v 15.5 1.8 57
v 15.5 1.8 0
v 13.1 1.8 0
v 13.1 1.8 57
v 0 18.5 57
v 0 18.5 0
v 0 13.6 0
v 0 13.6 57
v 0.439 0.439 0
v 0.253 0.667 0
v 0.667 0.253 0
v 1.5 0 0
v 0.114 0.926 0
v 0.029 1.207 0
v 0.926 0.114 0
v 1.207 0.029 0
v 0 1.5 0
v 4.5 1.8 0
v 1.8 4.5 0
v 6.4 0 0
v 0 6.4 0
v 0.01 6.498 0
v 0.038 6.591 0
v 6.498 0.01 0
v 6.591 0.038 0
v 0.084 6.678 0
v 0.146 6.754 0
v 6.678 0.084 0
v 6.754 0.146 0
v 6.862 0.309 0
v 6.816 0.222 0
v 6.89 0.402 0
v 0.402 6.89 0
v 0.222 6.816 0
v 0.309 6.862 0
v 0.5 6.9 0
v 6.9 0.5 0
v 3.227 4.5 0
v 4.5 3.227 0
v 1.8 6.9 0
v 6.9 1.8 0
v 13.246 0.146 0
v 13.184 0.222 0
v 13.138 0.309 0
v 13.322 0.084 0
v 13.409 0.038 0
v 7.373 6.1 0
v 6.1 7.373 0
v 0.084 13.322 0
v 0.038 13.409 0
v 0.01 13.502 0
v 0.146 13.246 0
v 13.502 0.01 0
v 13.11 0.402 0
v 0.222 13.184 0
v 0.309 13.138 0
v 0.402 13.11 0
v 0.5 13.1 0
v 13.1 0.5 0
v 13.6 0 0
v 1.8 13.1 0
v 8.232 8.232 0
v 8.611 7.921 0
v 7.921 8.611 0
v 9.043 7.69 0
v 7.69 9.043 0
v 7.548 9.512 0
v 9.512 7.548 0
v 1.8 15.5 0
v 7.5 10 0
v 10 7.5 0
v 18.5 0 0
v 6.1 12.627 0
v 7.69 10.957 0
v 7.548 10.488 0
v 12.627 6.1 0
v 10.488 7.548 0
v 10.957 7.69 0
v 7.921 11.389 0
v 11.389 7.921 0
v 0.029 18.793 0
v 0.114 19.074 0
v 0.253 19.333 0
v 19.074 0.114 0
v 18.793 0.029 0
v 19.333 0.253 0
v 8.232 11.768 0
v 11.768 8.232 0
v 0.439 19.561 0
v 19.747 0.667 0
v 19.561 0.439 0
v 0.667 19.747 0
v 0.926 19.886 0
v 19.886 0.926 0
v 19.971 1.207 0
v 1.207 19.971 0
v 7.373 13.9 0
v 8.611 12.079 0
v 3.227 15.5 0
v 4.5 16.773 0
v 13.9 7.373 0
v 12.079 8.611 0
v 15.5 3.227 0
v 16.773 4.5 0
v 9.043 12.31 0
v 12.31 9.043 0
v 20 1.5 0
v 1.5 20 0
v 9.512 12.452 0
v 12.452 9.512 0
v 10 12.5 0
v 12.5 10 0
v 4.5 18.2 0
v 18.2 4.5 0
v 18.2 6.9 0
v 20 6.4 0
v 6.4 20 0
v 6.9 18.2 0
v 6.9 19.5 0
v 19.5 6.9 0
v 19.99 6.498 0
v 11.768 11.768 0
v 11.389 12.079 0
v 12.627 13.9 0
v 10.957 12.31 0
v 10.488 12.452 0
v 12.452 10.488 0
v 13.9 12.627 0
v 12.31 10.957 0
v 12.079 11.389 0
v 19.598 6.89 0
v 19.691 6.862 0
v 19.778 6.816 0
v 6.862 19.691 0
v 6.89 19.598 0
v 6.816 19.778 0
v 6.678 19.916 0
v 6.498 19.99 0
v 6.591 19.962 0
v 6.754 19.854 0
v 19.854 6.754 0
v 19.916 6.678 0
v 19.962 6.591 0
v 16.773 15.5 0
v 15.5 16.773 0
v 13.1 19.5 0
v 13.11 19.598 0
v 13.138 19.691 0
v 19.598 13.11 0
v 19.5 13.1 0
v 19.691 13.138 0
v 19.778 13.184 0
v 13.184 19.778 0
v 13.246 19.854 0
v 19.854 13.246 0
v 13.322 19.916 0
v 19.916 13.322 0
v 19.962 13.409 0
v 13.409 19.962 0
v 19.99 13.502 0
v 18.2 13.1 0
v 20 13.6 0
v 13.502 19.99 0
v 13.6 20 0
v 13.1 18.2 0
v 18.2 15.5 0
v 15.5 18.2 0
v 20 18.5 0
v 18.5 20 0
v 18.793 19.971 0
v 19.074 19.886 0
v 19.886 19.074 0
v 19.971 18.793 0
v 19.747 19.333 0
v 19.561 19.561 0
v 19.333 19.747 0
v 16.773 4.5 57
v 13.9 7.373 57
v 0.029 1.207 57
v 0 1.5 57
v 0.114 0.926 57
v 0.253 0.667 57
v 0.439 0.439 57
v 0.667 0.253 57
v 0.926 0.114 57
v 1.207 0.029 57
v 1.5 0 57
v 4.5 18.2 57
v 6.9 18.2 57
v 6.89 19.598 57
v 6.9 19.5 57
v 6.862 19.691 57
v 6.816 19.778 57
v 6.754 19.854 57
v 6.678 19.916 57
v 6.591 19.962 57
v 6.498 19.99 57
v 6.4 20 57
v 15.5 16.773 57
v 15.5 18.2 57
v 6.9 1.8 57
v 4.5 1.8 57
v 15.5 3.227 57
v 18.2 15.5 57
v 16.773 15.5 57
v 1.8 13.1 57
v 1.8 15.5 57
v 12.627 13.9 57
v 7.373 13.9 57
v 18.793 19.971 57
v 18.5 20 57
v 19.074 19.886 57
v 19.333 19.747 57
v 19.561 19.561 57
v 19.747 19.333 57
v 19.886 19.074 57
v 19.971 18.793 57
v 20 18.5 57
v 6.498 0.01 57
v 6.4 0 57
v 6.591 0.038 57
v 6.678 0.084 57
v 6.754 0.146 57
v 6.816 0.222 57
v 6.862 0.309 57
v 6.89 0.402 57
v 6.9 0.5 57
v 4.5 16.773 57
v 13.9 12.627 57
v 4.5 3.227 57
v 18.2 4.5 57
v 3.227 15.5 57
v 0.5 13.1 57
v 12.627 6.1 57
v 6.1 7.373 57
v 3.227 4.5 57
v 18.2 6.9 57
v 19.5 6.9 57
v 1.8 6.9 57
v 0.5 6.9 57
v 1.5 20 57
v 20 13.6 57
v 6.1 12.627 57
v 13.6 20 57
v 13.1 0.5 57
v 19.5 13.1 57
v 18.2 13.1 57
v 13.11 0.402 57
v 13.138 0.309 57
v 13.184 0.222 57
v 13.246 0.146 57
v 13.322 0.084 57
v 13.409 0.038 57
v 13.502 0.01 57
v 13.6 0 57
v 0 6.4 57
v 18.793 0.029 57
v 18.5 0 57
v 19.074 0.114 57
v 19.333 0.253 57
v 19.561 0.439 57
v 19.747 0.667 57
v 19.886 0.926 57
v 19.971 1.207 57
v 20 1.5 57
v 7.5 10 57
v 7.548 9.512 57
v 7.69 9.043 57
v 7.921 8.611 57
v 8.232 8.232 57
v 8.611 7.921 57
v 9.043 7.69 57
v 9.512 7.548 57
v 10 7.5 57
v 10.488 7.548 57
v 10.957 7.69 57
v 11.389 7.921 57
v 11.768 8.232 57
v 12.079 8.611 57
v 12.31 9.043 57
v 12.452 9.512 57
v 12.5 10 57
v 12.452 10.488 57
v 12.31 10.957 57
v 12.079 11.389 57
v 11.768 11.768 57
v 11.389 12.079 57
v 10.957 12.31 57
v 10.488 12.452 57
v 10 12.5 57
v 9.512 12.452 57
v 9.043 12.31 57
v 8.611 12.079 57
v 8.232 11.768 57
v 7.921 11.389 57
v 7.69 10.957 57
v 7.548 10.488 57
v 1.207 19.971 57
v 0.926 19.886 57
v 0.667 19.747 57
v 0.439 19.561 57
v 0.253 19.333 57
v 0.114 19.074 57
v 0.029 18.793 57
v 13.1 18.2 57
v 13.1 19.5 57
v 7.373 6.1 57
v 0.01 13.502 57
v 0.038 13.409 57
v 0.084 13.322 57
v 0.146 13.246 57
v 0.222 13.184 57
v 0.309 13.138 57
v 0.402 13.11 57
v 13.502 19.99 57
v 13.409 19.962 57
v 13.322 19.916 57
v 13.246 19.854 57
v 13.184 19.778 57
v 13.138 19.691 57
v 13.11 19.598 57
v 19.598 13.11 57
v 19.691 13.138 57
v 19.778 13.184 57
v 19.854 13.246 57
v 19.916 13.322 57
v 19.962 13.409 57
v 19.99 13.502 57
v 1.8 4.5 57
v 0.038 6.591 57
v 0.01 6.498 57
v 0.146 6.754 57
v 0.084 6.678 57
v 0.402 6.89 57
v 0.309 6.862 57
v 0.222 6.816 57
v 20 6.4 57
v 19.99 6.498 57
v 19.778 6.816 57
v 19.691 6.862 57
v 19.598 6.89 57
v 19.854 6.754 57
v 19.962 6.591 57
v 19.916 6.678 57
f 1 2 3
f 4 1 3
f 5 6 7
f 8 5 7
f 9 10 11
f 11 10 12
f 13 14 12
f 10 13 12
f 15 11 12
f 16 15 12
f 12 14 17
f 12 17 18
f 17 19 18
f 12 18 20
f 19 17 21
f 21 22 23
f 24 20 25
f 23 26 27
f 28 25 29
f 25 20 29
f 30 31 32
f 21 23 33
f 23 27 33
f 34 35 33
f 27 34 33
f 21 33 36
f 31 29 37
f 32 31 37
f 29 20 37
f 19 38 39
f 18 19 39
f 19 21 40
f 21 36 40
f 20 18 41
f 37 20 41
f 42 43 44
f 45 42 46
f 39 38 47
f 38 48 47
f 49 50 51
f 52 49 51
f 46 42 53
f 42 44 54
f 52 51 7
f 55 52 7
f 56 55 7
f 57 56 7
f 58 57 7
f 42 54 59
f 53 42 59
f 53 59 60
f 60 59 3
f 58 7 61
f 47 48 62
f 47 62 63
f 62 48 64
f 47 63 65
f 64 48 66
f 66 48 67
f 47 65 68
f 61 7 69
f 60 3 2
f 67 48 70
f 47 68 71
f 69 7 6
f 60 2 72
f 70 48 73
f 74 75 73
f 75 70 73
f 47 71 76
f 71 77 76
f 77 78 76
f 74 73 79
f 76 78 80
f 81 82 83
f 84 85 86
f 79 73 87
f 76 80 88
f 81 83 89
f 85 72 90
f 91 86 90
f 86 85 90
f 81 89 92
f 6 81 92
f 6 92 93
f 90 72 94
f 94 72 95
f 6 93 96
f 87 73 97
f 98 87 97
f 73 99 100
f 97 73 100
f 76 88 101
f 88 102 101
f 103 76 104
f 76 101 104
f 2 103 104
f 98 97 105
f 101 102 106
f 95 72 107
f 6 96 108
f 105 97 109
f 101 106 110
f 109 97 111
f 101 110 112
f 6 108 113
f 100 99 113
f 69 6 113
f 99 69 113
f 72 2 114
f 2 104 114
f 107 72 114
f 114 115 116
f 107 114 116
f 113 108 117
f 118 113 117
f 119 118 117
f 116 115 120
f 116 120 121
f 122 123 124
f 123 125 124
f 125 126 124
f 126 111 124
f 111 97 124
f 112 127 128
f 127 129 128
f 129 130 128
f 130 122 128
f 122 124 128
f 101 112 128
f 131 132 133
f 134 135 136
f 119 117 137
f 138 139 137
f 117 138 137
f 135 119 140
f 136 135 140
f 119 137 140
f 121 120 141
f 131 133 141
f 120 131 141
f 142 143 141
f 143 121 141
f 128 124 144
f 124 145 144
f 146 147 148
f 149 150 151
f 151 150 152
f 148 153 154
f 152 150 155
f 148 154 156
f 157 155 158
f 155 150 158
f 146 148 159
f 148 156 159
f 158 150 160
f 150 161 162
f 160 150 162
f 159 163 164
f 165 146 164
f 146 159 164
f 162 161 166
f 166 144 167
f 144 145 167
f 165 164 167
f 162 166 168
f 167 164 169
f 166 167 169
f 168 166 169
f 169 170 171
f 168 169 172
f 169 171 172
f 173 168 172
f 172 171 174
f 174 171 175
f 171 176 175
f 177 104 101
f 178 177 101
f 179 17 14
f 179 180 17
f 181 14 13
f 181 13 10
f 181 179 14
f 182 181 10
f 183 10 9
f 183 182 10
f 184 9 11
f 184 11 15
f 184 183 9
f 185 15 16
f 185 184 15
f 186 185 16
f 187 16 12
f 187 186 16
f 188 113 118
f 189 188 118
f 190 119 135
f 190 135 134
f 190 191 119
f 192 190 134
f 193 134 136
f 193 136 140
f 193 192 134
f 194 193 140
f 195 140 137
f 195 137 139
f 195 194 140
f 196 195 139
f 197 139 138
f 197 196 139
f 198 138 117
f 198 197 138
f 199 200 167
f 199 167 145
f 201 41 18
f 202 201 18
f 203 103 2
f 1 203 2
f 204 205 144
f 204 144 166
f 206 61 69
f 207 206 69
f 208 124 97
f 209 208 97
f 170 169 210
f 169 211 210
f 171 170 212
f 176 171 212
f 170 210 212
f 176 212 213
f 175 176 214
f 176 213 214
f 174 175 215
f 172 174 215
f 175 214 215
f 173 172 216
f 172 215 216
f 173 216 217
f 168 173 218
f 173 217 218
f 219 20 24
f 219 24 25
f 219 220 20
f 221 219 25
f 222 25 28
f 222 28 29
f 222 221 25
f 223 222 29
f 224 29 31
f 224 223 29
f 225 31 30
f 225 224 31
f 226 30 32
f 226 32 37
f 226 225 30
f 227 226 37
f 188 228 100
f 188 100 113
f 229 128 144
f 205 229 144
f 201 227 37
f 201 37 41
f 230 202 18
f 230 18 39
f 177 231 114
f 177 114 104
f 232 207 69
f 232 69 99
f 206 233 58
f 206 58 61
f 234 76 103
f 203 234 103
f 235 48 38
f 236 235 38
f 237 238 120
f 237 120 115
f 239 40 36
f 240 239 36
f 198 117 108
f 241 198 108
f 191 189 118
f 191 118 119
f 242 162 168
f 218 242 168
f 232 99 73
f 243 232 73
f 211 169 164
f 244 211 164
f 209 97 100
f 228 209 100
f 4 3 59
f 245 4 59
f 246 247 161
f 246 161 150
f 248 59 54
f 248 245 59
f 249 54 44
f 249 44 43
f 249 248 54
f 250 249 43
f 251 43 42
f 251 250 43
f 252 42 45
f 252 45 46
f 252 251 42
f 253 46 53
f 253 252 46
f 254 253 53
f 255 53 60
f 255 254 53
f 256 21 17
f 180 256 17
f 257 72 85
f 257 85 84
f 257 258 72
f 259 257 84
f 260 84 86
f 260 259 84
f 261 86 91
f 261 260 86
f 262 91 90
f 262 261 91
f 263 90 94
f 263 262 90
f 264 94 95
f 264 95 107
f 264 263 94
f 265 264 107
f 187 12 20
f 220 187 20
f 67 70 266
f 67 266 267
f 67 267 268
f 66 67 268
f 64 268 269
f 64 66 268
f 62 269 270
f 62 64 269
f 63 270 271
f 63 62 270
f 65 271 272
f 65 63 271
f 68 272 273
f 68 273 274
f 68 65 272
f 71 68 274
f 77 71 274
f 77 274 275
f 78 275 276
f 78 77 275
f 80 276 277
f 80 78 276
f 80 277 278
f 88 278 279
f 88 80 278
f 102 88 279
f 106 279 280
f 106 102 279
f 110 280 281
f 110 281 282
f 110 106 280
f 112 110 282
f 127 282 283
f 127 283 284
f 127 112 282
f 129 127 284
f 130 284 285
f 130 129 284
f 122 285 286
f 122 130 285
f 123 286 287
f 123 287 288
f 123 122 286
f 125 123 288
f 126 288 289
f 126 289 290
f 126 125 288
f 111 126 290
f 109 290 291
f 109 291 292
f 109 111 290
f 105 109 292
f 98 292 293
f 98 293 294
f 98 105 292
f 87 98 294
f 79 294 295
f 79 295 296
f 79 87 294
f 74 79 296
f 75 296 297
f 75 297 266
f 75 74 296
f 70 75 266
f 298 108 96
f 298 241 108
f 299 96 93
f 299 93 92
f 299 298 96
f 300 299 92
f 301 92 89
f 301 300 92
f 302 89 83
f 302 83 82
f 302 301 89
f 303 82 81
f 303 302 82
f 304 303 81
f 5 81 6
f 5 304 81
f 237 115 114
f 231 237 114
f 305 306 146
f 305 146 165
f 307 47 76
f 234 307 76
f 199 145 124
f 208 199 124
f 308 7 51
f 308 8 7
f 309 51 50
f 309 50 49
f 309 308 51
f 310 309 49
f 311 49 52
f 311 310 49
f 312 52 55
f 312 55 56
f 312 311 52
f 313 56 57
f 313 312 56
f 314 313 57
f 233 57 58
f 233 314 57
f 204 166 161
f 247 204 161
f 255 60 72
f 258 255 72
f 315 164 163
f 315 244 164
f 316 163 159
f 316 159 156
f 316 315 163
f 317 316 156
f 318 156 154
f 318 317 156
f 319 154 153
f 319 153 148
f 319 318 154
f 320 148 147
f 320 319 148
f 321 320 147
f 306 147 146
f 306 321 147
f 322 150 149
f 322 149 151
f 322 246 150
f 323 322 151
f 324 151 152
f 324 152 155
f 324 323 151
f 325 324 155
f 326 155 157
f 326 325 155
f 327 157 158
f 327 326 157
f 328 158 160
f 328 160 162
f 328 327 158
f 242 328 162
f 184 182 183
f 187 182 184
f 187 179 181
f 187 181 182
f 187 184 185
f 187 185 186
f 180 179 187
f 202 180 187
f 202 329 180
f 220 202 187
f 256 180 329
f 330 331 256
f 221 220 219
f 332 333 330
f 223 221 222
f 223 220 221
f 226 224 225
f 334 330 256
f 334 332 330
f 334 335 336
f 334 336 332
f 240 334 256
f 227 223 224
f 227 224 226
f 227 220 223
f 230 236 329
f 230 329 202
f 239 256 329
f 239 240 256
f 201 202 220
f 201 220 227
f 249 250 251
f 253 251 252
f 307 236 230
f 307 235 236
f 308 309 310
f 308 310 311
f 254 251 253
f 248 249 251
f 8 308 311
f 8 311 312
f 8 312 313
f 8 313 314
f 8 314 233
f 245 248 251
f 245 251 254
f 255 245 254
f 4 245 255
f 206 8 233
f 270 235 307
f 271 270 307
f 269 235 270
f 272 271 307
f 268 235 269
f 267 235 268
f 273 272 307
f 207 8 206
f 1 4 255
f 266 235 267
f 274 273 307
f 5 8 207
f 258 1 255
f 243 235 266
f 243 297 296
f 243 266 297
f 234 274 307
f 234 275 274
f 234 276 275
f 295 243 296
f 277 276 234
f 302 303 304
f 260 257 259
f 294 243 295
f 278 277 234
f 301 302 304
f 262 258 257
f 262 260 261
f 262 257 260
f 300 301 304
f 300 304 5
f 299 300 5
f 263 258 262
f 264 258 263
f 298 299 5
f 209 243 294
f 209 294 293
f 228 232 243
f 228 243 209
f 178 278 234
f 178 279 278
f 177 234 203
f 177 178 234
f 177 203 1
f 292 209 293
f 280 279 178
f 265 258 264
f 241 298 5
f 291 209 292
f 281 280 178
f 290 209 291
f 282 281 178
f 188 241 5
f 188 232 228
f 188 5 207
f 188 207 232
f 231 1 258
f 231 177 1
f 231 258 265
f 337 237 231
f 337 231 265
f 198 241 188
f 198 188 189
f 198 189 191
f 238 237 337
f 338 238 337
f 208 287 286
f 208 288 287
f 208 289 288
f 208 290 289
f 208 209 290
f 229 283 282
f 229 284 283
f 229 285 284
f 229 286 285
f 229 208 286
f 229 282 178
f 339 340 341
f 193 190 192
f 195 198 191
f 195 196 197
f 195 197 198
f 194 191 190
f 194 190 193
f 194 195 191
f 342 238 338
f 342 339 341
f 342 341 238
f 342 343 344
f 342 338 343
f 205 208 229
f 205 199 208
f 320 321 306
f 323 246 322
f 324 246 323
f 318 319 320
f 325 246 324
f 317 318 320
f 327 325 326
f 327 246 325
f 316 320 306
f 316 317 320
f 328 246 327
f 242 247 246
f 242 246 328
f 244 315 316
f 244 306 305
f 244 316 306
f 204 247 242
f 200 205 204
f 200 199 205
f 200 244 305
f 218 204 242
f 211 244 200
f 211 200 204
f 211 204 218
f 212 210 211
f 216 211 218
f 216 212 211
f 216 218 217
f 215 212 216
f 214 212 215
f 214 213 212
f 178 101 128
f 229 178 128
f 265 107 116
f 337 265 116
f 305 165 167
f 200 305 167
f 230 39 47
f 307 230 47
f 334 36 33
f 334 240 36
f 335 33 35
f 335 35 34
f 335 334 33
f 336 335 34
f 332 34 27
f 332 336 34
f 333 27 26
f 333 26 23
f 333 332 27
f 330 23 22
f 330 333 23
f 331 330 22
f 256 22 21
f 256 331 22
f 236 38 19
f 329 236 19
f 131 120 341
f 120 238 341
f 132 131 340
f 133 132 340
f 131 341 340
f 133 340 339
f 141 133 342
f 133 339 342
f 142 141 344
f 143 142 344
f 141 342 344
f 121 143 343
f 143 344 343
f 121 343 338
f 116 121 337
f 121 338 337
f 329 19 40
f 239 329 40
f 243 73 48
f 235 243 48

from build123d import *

# Parameters (mm, degrees)
SKETCH_1_R      = 2.5
EXTRUDE_1_DEPTH = 57
FILLET_1_R      = 1.5
FILLET_2_R      = 1.5
FILLET_3_R      = 1.5
FILLET_4_R      = 1.5
FILLET_5_R      = 0.5
FILLET_6_R      = 0.5
FILLET_7_R      = 0.5
FILLET_8_R      = 0.5
FILLET_9_R      = 0.5
FILLET_10_R     = 0.5
FILLET_11_R     = 0.5
FILLET_12_R     = 0.5


with BuildPart() as part:
    # 草图1 → 凸台-拉伸1 (new body)
    with BuildSketch(Plane.XY):
        Polygon((0, 6.9), (0, 0), (6.9, 0), (6.9, 1.8), (4.5, 1.8), (4.5, 3.227207794), (7.372792206, 6.1), (12.627207794, 6.1), (15.5, 3.227207794), (15.5, 1.8), (13.1, 1.8), (13.1, 0), (20, 0), (20, 6.9), (18.2, 6.9), (18.2, 4.5), (16.772792206, 4.5), (13.9, 7.372792206), (13.9, 12.627207794), (16.772792206, 15.5), (18.2, 15.5), (18.2, 13.1), (20, 13.1), (20, 20), (13.1, 20), (13.1, 18.2), (15.5, 18.2), (15.5, 16.772792206), (12.627207794, 13.9), (7.372792206, 13.9), (4.5, 16.772792206), (4.5, 18.2), (6.9, 18.2), (6.9, 20), (0, 20), (0, 13.1), (1.8, 13.1), (1.8, 15.5), (3.227207794, 15.5), (6.1, 12.627207794), (6.1, 7.372792206), (3.227207794, 4.5), (1.8, 4.5), (1.8, 6.9), align=None)
        with Locations(Location((10, 10, 0), (0, 0, 180))):
            Circle(SKETCH_1_R, mode=Mode.SUBTRACT)
    extrude(amount=EXTRUDE_1_DEPTH)

    # 圆角1
    fillet_1_edges = [part.edges().sort_by_distance(p)[0] for p in [
        (20, 20, 28.5),
    ]]
    fillet(fillet_1_edges, radius=FILLET_1_R)

    # 圆角2
    fillet_2_edges = [part.edges().sort_by_distance(p)[0] for p in [
        (0, 20, 28.5),
    ]]
    fillet(fillet_2_edges, radius=FILLET_2_R)

    # 圆角3
    fillet_3_edges = [part.edges().sort_by_distance(p)[0] for p in [
        (0, 0, 28.5),
    ]]
    fillet(fillet_3_edges, radius=FILLET_3_R)

    # 圆角4
    fillet_4_edges = [part.edges().sort_by_distance(p)[0] for p in [
        (20, 0, 28.5),
    ]]
    fillet(fillet_4_edges, radius=FILLET_4_R)

    # 圆角5
    fillet_5_edges = [part.edges().sort_by_distance(p)[0] for p in [
        (13.1, 20, 28.5),
    ]]
    fillet(fillet_5_edges, radius=FILLET_5_R)

    # 圆角6
    fillet_6_edges = [part.edges().sort_by_distance(p)[0] for p in [
        (6.9, 20, 28.5),
    ]]
    fillet(fillet_6_edges, radius=FILLET_6_R)

    # 圆角7
    fillet_7_edges = [part.edges().sort_by_distance(p)[0] for p in [
        (0, 13.1, 28.5),
    ]]
    fillet(fillet_7_edges, radius=FILLET_7_R)

    # 圆角8
    fillet_8_edges = [part.edges().sort_by_distance(p)[0] for p in [
        (0, 6.9, 28.5),
    ]]
    fillet(fillet_8_edges, radius=FILLET_8_R)

    # 圆角9
    fillet_9_edges = [part.edges().sort_by_distance(p)[0] for p in [
        (6.9, 0, 28.5),
    ]]
    fillet(fillet_9_edges, radius=FILLET_9_R)

    # 圆角10
    fillet_10_edges = [part.edges().sort_by_distance(p)[0] for p in [
        (13.1, 0, 28.5),
    ]]
    fillet(fillet_10_edges, radius=FILLET_10_R)

    # 圆角11
    fillet_11_edges = [part.edges().sort_by_distance(p)[0] for p in [
        (20, 13.1, 28.5),
    ]]
    fillet(fillet_11_edges, radius=FILLET_11_R)

    # 圆角12
    fillet_12_edges = [part.edges().sort_by_distance(p)[0] for p in [
        (20, 6.9, 28.5),
    ]]
    fillet(fillet_12_edges, radius=FILLET_12_R)


solid = part.part
